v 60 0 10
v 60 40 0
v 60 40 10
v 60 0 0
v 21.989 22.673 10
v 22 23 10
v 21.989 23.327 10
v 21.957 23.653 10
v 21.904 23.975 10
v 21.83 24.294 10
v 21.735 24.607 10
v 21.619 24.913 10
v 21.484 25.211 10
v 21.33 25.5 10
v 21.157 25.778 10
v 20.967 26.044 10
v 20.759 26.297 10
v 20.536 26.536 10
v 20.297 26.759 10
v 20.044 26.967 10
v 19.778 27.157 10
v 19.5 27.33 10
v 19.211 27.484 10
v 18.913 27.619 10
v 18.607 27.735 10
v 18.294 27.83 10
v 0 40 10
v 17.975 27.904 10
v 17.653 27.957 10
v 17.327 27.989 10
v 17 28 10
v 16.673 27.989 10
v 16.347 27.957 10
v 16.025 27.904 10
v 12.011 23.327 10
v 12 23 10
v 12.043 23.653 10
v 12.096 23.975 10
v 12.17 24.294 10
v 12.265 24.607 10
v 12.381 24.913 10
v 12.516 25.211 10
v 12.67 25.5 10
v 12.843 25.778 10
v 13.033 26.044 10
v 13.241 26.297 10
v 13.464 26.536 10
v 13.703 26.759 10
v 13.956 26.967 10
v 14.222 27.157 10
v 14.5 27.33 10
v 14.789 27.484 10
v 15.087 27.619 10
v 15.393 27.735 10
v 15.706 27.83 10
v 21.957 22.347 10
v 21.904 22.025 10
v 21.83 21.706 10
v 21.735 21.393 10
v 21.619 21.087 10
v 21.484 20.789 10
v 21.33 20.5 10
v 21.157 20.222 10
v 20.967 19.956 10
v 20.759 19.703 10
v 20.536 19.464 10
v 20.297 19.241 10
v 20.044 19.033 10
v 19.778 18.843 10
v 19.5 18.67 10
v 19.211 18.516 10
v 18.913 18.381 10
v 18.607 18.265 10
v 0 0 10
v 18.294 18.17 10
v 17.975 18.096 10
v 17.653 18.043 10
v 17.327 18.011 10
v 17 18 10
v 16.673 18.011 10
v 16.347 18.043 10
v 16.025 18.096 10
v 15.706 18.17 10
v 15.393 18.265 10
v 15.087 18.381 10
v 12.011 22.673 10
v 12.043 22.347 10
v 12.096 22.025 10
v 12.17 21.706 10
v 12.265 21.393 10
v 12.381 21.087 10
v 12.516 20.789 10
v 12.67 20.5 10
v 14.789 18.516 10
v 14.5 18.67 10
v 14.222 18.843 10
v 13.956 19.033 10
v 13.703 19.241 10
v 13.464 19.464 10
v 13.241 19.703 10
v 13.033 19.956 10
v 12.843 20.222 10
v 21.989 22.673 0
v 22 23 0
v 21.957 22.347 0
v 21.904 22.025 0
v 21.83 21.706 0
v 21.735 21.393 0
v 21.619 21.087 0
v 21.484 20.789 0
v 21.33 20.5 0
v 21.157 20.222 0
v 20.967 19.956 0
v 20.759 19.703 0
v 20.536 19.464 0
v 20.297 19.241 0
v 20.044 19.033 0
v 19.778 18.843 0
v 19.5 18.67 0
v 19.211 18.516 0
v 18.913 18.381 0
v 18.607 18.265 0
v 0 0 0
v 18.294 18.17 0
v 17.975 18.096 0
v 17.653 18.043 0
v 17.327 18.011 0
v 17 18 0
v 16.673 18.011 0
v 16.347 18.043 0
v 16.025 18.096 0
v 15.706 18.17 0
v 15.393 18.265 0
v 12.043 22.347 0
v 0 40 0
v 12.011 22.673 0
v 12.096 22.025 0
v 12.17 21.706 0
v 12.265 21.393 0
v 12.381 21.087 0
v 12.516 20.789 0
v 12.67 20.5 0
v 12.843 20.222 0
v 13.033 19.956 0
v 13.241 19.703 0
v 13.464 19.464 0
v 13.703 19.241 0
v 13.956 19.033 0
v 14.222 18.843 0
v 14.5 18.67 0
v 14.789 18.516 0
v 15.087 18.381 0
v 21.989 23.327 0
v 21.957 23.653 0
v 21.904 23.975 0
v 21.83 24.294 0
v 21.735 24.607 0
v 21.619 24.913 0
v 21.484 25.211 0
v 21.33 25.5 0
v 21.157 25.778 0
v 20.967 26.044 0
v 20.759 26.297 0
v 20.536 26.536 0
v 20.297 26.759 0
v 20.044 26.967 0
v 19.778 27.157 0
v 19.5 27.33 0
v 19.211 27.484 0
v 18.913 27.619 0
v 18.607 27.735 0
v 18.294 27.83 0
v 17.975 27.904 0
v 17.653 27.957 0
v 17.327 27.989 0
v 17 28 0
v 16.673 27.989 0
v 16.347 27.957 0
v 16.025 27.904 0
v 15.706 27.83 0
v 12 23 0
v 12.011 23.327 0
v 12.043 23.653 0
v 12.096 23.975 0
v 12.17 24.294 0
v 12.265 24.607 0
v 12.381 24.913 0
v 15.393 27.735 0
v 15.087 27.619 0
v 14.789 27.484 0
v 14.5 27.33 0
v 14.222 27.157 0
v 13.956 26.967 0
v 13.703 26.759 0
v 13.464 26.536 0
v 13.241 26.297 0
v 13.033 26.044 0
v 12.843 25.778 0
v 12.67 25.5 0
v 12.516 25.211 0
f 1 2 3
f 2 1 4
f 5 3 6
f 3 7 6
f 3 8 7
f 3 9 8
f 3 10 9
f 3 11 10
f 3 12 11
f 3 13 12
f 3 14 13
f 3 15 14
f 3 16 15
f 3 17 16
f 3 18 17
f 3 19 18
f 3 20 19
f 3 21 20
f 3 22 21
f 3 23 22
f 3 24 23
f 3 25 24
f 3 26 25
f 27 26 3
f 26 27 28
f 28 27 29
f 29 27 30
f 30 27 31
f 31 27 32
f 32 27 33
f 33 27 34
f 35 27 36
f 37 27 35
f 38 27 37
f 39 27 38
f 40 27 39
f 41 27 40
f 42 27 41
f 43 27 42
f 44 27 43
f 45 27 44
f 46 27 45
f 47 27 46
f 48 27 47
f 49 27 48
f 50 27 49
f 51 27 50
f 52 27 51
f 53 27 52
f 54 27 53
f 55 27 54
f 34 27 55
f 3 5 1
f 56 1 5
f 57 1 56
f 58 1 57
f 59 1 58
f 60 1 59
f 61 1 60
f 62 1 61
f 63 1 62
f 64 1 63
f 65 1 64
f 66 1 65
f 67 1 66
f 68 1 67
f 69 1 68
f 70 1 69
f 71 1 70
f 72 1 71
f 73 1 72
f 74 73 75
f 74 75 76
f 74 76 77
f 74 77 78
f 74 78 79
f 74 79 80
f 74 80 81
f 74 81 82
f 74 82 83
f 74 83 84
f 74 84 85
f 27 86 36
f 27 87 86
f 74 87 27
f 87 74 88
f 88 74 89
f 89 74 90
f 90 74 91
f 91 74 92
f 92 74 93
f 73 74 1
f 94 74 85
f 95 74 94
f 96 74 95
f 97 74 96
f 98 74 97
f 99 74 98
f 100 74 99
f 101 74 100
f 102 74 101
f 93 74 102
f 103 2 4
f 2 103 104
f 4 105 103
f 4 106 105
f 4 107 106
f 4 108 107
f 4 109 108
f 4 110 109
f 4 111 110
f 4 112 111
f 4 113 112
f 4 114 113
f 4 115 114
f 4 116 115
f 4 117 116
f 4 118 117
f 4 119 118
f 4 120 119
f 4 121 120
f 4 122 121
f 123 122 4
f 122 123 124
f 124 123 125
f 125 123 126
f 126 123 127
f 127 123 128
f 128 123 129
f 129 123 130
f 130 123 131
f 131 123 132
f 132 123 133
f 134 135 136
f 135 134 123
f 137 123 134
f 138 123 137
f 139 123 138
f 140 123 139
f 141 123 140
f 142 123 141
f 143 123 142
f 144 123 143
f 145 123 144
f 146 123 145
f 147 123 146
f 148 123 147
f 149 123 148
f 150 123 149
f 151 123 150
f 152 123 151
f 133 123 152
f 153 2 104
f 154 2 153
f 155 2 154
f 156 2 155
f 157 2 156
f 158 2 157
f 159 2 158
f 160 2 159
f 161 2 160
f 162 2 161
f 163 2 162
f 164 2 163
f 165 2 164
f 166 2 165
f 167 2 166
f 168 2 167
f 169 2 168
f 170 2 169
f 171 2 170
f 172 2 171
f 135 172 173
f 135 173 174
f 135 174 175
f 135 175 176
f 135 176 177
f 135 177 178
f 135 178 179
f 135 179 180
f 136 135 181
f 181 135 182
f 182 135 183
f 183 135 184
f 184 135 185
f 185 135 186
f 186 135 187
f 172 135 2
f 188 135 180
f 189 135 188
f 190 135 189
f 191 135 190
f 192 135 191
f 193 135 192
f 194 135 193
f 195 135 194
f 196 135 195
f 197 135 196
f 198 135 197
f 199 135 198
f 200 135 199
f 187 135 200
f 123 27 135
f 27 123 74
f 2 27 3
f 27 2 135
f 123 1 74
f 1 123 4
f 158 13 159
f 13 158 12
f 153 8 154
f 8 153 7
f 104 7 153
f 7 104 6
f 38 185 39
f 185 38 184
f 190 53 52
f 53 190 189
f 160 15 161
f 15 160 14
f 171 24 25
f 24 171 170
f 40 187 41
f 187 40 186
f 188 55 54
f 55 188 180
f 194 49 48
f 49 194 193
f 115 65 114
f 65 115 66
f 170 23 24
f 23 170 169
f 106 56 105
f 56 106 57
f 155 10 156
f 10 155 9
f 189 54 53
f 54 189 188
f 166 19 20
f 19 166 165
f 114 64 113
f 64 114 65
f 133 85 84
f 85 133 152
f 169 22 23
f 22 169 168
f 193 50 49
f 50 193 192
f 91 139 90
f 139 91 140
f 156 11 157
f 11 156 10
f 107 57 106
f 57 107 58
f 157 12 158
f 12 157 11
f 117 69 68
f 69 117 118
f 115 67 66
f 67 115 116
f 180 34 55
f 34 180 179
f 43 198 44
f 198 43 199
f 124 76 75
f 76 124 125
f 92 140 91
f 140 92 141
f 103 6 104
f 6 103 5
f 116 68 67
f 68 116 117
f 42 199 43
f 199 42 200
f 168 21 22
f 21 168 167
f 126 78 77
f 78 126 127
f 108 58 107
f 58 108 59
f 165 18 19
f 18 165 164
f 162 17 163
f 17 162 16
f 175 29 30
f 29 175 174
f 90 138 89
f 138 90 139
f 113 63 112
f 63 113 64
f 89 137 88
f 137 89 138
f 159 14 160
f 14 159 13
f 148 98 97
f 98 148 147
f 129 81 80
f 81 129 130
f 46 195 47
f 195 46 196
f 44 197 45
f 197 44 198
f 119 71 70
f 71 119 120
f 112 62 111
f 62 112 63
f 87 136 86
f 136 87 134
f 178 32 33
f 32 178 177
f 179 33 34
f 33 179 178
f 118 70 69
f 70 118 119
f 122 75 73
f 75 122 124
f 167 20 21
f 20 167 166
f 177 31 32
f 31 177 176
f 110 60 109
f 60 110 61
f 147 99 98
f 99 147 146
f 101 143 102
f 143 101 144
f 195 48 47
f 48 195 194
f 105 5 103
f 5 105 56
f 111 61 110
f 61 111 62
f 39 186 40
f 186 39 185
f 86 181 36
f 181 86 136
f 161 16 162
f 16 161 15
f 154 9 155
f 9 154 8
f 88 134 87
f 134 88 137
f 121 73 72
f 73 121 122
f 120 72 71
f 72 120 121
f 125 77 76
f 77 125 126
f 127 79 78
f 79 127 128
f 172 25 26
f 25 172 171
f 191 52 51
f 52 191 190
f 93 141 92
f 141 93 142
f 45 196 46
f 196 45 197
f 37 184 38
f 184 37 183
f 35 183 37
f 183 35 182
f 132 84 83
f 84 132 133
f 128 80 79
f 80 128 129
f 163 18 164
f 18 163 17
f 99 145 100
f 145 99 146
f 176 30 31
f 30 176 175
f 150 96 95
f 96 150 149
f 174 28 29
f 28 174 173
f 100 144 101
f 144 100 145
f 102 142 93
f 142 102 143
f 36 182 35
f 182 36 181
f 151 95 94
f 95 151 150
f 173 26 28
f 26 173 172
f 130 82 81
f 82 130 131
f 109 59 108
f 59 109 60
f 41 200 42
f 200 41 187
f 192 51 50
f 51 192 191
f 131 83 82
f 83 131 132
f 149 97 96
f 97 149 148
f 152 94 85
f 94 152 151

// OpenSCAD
// Synthetic millimetre fixture. Origin is the lower left bottom corner.
bore = 10;
$fn = 96;
difference() {
    cube([60, 40, 10]);
    translate([17, 23, -1]) cylinder(h=12, d=bore);
}
